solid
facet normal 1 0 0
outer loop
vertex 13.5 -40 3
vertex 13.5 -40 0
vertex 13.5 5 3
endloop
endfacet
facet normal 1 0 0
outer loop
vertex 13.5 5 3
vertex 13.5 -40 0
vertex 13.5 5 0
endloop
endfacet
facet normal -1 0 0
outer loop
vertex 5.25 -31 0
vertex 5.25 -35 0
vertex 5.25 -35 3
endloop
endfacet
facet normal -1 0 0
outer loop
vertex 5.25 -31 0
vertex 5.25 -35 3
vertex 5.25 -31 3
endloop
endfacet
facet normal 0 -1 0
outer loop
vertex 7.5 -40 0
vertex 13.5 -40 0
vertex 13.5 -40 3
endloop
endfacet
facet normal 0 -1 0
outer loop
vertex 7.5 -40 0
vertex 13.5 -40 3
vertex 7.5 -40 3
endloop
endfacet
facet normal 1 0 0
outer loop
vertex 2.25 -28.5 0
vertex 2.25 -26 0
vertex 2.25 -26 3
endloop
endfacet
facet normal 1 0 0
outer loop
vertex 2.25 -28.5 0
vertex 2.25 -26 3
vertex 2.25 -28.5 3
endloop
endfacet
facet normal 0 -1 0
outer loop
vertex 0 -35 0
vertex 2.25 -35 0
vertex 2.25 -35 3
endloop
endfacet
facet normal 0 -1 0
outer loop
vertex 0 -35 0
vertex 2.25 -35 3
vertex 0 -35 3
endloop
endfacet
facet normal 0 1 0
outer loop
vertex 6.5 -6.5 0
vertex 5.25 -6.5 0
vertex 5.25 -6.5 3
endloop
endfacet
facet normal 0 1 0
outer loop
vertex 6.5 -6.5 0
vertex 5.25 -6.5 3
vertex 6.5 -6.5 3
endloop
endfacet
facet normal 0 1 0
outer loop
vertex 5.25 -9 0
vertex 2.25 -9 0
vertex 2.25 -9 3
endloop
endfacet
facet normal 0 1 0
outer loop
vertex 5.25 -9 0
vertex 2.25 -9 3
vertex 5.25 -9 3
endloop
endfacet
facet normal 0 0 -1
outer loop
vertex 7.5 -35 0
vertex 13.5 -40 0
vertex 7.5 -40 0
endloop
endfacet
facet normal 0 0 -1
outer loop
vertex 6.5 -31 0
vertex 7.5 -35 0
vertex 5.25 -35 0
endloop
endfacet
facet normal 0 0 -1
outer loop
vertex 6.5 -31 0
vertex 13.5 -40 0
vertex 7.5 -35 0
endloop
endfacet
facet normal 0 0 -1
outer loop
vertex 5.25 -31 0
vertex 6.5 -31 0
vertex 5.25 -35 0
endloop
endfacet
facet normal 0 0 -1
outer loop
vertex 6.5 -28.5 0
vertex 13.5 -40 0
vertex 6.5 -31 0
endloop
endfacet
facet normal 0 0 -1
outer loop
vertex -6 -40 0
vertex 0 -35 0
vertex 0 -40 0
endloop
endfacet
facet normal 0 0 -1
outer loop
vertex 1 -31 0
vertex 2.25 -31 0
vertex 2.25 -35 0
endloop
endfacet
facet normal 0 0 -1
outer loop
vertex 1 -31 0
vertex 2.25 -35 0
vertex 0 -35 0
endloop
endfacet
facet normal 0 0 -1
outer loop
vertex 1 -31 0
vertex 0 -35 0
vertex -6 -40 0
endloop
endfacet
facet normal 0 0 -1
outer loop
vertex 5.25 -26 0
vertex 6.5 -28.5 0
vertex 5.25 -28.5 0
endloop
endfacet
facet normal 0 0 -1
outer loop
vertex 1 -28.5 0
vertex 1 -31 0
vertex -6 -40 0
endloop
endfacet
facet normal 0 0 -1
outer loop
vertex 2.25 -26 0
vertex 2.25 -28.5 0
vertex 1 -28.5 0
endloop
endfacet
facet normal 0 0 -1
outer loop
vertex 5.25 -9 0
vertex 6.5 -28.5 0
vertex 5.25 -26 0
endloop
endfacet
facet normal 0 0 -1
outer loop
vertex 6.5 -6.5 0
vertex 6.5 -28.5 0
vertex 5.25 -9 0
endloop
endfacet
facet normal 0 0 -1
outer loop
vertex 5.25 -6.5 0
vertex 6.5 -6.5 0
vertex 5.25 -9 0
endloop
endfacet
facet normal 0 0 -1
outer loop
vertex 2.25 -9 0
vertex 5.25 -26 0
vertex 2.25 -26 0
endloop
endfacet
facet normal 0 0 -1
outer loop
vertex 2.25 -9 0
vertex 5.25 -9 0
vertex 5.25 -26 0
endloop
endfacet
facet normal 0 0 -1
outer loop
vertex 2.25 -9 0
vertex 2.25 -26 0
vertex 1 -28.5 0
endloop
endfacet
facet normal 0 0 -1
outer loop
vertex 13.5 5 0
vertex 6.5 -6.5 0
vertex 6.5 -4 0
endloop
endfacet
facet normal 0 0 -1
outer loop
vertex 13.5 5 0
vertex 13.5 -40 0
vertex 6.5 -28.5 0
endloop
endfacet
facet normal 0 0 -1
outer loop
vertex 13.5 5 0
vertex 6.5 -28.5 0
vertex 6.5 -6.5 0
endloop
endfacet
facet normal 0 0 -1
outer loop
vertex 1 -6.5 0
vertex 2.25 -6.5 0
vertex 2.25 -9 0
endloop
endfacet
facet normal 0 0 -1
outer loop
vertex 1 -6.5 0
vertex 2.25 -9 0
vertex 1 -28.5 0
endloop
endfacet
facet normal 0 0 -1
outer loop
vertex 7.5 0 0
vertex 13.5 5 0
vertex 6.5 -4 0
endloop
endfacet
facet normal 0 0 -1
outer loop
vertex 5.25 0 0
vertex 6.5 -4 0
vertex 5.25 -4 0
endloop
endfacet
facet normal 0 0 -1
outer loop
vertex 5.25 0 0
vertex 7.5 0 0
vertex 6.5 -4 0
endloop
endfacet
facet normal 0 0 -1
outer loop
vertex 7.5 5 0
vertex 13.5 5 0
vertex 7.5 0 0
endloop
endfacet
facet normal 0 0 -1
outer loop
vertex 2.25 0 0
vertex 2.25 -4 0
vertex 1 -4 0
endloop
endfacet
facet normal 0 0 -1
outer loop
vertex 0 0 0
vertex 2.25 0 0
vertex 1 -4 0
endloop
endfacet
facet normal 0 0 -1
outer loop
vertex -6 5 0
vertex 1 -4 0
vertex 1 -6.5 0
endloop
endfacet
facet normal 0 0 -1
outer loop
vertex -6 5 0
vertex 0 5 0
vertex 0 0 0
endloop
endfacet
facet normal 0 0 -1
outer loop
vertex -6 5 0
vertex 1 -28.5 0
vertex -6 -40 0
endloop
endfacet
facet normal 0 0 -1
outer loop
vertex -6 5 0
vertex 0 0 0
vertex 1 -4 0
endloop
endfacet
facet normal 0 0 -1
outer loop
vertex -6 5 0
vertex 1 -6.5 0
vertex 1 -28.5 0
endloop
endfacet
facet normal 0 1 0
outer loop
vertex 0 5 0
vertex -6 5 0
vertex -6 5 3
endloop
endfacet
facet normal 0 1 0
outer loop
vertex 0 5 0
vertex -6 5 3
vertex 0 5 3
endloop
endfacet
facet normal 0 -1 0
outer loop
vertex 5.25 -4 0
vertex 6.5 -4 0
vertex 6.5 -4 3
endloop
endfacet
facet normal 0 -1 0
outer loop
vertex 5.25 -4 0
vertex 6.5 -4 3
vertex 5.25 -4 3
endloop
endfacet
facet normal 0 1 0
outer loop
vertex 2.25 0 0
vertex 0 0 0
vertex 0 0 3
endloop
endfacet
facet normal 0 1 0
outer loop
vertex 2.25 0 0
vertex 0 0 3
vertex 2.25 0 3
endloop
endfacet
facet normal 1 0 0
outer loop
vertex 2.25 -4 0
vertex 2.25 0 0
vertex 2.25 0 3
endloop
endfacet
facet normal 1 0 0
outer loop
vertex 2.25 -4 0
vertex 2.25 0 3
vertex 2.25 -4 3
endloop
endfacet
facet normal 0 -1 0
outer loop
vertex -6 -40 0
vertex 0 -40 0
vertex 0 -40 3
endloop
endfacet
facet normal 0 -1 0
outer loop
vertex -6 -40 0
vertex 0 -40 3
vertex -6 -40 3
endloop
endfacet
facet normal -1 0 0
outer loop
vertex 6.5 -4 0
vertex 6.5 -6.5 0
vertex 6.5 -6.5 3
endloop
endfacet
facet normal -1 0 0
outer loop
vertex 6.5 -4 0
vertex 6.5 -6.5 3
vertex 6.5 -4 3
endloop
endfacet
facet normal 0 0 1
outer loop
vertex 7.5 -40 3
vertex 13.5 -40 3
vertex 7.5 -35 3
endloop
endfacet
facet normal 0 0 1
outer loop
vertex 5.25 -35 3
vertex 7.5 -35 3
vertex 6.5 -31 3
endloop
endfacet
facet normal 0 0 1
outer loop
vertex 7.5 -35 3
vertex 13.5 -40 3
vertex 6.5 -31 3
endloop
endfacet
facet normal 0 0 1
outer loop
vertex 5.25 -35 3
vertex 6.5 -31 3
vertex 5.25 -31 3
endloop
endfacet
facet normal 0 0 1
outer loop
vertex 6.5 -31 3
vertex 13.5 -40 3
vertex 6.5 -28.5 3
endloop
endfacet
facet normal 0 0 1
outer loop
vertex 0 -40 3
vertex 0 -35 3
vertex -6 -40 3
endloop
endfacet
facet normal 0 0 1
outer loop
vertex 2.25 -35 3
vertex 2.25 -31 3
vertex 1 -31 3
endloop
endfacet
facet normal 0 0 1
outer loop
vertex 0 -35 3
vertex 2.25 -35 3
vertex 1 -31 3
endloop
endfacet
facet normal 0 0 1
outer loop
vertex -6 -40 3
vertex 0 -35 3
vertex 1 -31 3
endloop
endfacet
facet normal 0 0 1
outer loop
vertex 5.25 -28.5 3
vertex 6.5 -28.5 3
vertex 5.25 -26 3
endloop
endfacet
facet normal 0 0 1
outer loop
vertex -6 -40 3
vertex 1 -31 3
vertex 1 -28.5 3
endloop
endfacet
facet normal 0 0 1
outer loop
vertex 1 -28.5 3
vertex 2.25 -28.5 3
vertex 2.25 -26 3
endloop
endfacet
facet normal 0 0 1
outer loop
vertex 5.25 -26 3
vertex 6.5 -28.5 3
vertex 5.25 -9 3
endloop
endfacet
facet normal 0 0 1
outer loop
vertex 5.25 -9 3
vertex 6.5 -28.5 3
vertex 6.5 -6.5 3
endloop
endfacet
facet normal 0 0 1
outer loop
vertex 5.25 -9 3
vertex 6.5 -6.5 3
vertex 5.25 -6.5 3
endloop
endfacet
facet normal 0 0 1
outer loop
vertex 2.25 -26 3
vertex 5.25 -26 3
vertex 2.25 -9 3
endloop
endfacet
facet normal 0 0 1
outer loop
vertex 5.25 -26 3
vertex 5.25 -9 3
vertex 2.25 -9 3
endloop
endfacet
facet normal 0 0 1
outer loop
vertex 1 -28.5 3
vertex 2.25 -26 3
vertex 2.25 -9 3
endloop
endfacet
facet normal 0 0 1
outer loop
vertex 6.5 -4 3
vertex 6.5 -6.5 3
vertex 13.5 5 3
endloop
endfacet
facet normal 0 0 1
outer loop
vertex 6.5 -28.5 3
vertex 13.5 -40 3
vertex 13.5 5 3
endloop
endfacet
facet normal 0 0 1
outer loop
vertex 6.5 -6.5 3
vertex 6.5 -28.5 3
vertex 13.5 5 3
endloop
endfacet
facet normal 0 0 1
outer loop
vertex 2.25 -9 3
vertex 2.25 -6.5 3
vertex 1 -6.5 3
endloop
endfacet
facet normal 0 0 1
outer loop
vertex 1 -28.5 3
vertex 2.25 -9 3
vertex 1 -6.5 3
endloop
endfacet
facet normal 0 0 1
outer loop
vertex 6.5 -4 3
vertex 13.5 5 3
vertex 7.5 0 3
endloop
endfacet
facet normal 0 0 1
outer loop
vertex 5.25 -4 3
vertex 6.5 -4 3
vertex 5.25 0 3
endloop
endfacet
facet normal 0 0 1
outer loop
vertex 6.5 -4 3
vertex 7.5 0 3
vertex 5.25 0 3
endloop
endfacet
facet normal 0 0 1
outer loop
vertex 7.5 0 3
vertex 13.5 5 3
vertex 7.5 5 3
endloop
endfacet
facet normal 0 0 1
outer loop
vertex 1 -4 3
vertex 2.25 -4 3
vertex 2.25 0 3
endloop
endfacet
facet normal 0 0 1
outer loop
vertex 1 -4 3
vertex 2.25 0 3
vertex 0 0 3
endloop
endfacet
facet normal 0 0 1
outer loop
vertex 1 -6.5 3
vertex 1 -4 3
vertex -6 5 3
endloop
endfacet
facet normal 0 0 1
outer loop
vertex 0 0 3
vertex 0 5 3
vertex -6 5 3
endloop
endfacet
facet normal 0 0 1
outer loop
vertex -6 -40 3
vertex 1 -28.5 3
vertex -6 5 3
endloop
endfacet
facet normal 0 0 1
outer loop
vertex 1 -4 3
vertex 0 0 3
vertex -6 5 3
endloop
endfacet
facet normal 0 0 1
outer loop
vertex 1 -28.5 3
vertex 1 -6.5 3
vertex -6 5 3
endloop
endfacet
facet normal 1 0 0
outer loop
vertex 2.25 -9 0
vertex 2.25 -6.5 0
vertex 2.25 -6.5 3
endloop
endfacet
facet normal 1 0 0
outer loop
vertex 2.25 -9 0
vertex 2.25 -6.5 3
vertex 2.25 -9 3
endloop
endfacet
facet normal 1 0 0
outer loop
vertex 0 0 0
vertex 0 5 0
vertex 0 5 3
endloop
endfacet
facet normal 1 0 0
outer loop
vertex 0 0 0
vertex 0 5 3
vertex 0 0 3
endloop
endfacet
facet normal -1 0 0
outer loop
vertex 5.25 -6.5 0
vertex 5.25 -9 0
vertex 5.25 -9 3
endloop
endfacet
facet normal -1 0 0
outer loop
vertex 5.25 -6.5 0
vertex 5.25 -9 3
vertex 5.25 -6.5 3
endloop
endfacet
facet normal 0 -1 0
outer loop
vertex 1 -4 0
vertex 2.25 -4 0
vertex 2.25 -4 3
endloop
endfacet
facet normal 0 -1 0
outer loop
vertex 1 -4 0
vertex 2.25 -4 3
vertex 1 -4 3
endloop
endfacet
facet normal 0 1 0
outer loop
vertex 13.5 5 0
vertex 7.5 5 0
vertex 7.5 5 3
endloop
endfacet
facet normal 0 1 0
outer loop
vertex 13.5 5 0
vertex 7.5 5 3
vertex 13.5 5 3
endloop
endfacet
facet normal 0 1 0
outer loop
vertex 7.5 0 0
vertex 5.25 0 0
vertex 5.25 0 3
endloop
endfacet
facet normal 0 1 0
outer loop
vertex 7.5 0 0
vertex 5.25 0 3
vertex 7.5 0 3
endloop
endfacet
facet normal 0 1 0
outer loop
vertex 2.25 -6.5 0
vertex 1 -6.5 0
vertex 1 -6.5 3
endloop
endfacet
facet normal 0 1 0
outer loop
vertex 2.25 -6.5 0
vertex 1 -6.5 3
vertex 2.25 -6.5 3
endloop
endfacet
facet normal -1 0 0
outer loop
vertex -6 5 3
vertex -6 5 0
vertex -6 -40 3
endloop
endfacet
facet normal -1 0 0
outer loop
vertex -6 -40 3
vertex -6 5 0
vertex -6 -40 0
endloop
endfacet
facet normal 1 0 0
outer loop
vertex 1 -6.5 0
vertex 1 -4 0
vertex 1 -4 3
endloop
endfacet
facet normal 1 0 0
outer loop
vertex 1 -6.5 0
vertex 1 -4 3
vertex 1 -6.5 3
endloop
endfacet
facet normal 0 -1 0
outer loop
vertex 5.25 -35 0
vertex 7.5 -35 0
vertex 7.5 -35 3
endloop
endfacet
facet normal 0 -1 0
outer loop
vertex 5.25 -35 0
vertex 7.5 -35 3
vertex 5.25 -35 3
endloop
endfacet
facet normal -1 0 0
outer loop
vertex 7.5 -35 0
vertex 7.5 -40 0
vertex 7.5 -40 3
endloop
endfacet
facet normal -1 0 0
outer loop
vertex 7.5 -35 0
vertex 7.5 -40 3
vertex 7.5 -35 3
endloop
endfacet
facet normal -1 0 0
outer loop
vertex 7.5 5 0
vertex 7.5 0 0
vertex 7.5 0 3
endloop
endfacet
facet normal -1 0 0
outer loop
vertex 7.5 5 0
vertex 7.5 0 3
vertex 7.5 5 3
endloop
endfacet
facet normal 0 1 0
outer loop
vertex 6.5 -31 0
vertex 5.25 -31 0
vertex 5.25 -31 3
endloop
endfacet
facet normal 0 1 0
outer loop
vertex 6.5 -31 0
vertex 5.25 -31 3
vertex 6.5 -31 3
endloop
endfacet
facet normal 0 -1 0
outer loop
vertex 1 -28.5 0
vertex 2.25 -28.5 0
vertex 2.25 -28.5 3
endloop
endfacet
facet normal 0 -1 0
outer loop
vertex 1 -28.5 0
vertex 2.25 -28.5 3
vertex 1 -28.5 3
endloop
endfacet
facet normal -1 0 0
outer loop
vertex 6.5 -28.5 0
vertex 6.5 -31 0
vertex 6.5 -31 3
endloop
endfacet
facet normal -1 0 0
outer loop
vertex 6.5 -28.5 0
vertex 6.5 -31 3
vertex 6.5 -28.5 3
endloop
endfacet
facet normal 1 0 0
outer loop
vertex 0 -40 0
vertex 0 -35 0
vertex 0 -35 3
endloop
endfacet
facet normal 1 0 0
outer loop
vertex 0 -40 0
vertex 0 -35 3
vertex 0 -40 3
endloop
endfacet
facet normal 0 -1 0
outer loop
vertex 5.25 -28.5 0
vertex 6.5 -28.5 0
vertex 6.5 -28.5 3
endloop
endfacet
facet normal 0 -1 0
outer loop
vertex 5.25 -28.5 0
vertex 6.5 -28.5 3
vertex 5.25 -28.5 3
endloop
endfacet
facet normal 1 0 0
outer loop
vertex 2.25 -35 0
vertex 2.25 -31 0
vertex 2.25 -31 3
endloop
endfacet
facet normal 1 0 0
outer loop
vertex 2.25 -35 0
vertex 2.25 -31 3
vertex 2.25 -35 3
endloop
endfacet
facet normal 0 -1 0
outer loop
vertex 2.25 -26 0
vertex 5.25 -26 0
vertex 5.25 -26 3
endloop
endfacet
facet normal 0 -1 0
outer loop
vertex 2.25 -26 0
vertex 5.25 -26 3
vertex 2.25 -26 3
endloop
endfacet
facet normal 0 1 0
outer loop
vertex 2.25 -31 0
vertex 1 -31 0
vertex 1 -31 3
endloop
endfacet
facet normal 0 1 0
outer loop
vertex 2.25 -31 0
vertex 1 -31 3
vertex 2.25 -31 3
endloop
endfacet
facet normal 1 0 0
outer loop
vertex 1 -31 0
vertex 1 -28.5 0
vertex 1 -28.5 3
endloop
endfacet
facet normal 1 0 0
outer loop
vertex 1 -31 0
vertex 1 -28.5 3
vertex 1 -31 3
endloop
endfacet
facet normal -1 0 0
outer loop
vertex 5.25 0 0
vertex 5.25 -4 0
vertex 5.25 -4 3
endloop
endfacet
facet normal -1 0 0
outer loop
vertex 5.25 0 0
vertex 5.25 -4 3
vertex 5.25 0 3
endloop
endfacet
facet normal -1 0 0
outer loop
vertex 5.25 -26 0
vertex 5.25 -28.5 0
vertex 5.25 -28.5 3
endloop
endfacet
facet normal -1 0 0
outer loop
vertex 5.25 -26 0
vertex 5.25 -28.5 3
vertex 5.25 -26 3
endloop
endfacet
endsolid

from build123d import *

# Parameters (mm, degrees)
RESSALTO_EXTRUS_O1_DEPTH = 3


with BuildPart() as part:
    # Esboço1 → Ressalto-extrusão1 (new body)
    with BuildSketch(Plane.XY):
        Polygon((0, 0), (2.25, 0), (2.25, -4), (1, -4), (1, -6.5), (2.25, -6.5), (2.25, -9), (5.25, -9), (5.25, -6.5), (6.5, -6.5), (6.5, -4), (5.25, -4), (5.25, 0), (7.5, 0), (7.5, 5), (13.5, 5), (13.5, 0), (13.5, -35), (13.5, -40), (7.5, -40), (7.5, -35), (5.25, -35), (5.25, -31), (6.5, -31), (6.5, -28.5), (5.25, -28.5), (5.25, -26), (2.25, -26), (2.25, -28.5), (1, -28.5), (1, -31), (2.25, -31), (2.25, -35), (0, -35), (0, -40), (-6, -40), (-6, -35), (-6, 0), (-6, 5), (0, 5), align=None)
    extrude(amount=RESSALTO_EXTRUS_O1_DEPTH)


solid = part.part
